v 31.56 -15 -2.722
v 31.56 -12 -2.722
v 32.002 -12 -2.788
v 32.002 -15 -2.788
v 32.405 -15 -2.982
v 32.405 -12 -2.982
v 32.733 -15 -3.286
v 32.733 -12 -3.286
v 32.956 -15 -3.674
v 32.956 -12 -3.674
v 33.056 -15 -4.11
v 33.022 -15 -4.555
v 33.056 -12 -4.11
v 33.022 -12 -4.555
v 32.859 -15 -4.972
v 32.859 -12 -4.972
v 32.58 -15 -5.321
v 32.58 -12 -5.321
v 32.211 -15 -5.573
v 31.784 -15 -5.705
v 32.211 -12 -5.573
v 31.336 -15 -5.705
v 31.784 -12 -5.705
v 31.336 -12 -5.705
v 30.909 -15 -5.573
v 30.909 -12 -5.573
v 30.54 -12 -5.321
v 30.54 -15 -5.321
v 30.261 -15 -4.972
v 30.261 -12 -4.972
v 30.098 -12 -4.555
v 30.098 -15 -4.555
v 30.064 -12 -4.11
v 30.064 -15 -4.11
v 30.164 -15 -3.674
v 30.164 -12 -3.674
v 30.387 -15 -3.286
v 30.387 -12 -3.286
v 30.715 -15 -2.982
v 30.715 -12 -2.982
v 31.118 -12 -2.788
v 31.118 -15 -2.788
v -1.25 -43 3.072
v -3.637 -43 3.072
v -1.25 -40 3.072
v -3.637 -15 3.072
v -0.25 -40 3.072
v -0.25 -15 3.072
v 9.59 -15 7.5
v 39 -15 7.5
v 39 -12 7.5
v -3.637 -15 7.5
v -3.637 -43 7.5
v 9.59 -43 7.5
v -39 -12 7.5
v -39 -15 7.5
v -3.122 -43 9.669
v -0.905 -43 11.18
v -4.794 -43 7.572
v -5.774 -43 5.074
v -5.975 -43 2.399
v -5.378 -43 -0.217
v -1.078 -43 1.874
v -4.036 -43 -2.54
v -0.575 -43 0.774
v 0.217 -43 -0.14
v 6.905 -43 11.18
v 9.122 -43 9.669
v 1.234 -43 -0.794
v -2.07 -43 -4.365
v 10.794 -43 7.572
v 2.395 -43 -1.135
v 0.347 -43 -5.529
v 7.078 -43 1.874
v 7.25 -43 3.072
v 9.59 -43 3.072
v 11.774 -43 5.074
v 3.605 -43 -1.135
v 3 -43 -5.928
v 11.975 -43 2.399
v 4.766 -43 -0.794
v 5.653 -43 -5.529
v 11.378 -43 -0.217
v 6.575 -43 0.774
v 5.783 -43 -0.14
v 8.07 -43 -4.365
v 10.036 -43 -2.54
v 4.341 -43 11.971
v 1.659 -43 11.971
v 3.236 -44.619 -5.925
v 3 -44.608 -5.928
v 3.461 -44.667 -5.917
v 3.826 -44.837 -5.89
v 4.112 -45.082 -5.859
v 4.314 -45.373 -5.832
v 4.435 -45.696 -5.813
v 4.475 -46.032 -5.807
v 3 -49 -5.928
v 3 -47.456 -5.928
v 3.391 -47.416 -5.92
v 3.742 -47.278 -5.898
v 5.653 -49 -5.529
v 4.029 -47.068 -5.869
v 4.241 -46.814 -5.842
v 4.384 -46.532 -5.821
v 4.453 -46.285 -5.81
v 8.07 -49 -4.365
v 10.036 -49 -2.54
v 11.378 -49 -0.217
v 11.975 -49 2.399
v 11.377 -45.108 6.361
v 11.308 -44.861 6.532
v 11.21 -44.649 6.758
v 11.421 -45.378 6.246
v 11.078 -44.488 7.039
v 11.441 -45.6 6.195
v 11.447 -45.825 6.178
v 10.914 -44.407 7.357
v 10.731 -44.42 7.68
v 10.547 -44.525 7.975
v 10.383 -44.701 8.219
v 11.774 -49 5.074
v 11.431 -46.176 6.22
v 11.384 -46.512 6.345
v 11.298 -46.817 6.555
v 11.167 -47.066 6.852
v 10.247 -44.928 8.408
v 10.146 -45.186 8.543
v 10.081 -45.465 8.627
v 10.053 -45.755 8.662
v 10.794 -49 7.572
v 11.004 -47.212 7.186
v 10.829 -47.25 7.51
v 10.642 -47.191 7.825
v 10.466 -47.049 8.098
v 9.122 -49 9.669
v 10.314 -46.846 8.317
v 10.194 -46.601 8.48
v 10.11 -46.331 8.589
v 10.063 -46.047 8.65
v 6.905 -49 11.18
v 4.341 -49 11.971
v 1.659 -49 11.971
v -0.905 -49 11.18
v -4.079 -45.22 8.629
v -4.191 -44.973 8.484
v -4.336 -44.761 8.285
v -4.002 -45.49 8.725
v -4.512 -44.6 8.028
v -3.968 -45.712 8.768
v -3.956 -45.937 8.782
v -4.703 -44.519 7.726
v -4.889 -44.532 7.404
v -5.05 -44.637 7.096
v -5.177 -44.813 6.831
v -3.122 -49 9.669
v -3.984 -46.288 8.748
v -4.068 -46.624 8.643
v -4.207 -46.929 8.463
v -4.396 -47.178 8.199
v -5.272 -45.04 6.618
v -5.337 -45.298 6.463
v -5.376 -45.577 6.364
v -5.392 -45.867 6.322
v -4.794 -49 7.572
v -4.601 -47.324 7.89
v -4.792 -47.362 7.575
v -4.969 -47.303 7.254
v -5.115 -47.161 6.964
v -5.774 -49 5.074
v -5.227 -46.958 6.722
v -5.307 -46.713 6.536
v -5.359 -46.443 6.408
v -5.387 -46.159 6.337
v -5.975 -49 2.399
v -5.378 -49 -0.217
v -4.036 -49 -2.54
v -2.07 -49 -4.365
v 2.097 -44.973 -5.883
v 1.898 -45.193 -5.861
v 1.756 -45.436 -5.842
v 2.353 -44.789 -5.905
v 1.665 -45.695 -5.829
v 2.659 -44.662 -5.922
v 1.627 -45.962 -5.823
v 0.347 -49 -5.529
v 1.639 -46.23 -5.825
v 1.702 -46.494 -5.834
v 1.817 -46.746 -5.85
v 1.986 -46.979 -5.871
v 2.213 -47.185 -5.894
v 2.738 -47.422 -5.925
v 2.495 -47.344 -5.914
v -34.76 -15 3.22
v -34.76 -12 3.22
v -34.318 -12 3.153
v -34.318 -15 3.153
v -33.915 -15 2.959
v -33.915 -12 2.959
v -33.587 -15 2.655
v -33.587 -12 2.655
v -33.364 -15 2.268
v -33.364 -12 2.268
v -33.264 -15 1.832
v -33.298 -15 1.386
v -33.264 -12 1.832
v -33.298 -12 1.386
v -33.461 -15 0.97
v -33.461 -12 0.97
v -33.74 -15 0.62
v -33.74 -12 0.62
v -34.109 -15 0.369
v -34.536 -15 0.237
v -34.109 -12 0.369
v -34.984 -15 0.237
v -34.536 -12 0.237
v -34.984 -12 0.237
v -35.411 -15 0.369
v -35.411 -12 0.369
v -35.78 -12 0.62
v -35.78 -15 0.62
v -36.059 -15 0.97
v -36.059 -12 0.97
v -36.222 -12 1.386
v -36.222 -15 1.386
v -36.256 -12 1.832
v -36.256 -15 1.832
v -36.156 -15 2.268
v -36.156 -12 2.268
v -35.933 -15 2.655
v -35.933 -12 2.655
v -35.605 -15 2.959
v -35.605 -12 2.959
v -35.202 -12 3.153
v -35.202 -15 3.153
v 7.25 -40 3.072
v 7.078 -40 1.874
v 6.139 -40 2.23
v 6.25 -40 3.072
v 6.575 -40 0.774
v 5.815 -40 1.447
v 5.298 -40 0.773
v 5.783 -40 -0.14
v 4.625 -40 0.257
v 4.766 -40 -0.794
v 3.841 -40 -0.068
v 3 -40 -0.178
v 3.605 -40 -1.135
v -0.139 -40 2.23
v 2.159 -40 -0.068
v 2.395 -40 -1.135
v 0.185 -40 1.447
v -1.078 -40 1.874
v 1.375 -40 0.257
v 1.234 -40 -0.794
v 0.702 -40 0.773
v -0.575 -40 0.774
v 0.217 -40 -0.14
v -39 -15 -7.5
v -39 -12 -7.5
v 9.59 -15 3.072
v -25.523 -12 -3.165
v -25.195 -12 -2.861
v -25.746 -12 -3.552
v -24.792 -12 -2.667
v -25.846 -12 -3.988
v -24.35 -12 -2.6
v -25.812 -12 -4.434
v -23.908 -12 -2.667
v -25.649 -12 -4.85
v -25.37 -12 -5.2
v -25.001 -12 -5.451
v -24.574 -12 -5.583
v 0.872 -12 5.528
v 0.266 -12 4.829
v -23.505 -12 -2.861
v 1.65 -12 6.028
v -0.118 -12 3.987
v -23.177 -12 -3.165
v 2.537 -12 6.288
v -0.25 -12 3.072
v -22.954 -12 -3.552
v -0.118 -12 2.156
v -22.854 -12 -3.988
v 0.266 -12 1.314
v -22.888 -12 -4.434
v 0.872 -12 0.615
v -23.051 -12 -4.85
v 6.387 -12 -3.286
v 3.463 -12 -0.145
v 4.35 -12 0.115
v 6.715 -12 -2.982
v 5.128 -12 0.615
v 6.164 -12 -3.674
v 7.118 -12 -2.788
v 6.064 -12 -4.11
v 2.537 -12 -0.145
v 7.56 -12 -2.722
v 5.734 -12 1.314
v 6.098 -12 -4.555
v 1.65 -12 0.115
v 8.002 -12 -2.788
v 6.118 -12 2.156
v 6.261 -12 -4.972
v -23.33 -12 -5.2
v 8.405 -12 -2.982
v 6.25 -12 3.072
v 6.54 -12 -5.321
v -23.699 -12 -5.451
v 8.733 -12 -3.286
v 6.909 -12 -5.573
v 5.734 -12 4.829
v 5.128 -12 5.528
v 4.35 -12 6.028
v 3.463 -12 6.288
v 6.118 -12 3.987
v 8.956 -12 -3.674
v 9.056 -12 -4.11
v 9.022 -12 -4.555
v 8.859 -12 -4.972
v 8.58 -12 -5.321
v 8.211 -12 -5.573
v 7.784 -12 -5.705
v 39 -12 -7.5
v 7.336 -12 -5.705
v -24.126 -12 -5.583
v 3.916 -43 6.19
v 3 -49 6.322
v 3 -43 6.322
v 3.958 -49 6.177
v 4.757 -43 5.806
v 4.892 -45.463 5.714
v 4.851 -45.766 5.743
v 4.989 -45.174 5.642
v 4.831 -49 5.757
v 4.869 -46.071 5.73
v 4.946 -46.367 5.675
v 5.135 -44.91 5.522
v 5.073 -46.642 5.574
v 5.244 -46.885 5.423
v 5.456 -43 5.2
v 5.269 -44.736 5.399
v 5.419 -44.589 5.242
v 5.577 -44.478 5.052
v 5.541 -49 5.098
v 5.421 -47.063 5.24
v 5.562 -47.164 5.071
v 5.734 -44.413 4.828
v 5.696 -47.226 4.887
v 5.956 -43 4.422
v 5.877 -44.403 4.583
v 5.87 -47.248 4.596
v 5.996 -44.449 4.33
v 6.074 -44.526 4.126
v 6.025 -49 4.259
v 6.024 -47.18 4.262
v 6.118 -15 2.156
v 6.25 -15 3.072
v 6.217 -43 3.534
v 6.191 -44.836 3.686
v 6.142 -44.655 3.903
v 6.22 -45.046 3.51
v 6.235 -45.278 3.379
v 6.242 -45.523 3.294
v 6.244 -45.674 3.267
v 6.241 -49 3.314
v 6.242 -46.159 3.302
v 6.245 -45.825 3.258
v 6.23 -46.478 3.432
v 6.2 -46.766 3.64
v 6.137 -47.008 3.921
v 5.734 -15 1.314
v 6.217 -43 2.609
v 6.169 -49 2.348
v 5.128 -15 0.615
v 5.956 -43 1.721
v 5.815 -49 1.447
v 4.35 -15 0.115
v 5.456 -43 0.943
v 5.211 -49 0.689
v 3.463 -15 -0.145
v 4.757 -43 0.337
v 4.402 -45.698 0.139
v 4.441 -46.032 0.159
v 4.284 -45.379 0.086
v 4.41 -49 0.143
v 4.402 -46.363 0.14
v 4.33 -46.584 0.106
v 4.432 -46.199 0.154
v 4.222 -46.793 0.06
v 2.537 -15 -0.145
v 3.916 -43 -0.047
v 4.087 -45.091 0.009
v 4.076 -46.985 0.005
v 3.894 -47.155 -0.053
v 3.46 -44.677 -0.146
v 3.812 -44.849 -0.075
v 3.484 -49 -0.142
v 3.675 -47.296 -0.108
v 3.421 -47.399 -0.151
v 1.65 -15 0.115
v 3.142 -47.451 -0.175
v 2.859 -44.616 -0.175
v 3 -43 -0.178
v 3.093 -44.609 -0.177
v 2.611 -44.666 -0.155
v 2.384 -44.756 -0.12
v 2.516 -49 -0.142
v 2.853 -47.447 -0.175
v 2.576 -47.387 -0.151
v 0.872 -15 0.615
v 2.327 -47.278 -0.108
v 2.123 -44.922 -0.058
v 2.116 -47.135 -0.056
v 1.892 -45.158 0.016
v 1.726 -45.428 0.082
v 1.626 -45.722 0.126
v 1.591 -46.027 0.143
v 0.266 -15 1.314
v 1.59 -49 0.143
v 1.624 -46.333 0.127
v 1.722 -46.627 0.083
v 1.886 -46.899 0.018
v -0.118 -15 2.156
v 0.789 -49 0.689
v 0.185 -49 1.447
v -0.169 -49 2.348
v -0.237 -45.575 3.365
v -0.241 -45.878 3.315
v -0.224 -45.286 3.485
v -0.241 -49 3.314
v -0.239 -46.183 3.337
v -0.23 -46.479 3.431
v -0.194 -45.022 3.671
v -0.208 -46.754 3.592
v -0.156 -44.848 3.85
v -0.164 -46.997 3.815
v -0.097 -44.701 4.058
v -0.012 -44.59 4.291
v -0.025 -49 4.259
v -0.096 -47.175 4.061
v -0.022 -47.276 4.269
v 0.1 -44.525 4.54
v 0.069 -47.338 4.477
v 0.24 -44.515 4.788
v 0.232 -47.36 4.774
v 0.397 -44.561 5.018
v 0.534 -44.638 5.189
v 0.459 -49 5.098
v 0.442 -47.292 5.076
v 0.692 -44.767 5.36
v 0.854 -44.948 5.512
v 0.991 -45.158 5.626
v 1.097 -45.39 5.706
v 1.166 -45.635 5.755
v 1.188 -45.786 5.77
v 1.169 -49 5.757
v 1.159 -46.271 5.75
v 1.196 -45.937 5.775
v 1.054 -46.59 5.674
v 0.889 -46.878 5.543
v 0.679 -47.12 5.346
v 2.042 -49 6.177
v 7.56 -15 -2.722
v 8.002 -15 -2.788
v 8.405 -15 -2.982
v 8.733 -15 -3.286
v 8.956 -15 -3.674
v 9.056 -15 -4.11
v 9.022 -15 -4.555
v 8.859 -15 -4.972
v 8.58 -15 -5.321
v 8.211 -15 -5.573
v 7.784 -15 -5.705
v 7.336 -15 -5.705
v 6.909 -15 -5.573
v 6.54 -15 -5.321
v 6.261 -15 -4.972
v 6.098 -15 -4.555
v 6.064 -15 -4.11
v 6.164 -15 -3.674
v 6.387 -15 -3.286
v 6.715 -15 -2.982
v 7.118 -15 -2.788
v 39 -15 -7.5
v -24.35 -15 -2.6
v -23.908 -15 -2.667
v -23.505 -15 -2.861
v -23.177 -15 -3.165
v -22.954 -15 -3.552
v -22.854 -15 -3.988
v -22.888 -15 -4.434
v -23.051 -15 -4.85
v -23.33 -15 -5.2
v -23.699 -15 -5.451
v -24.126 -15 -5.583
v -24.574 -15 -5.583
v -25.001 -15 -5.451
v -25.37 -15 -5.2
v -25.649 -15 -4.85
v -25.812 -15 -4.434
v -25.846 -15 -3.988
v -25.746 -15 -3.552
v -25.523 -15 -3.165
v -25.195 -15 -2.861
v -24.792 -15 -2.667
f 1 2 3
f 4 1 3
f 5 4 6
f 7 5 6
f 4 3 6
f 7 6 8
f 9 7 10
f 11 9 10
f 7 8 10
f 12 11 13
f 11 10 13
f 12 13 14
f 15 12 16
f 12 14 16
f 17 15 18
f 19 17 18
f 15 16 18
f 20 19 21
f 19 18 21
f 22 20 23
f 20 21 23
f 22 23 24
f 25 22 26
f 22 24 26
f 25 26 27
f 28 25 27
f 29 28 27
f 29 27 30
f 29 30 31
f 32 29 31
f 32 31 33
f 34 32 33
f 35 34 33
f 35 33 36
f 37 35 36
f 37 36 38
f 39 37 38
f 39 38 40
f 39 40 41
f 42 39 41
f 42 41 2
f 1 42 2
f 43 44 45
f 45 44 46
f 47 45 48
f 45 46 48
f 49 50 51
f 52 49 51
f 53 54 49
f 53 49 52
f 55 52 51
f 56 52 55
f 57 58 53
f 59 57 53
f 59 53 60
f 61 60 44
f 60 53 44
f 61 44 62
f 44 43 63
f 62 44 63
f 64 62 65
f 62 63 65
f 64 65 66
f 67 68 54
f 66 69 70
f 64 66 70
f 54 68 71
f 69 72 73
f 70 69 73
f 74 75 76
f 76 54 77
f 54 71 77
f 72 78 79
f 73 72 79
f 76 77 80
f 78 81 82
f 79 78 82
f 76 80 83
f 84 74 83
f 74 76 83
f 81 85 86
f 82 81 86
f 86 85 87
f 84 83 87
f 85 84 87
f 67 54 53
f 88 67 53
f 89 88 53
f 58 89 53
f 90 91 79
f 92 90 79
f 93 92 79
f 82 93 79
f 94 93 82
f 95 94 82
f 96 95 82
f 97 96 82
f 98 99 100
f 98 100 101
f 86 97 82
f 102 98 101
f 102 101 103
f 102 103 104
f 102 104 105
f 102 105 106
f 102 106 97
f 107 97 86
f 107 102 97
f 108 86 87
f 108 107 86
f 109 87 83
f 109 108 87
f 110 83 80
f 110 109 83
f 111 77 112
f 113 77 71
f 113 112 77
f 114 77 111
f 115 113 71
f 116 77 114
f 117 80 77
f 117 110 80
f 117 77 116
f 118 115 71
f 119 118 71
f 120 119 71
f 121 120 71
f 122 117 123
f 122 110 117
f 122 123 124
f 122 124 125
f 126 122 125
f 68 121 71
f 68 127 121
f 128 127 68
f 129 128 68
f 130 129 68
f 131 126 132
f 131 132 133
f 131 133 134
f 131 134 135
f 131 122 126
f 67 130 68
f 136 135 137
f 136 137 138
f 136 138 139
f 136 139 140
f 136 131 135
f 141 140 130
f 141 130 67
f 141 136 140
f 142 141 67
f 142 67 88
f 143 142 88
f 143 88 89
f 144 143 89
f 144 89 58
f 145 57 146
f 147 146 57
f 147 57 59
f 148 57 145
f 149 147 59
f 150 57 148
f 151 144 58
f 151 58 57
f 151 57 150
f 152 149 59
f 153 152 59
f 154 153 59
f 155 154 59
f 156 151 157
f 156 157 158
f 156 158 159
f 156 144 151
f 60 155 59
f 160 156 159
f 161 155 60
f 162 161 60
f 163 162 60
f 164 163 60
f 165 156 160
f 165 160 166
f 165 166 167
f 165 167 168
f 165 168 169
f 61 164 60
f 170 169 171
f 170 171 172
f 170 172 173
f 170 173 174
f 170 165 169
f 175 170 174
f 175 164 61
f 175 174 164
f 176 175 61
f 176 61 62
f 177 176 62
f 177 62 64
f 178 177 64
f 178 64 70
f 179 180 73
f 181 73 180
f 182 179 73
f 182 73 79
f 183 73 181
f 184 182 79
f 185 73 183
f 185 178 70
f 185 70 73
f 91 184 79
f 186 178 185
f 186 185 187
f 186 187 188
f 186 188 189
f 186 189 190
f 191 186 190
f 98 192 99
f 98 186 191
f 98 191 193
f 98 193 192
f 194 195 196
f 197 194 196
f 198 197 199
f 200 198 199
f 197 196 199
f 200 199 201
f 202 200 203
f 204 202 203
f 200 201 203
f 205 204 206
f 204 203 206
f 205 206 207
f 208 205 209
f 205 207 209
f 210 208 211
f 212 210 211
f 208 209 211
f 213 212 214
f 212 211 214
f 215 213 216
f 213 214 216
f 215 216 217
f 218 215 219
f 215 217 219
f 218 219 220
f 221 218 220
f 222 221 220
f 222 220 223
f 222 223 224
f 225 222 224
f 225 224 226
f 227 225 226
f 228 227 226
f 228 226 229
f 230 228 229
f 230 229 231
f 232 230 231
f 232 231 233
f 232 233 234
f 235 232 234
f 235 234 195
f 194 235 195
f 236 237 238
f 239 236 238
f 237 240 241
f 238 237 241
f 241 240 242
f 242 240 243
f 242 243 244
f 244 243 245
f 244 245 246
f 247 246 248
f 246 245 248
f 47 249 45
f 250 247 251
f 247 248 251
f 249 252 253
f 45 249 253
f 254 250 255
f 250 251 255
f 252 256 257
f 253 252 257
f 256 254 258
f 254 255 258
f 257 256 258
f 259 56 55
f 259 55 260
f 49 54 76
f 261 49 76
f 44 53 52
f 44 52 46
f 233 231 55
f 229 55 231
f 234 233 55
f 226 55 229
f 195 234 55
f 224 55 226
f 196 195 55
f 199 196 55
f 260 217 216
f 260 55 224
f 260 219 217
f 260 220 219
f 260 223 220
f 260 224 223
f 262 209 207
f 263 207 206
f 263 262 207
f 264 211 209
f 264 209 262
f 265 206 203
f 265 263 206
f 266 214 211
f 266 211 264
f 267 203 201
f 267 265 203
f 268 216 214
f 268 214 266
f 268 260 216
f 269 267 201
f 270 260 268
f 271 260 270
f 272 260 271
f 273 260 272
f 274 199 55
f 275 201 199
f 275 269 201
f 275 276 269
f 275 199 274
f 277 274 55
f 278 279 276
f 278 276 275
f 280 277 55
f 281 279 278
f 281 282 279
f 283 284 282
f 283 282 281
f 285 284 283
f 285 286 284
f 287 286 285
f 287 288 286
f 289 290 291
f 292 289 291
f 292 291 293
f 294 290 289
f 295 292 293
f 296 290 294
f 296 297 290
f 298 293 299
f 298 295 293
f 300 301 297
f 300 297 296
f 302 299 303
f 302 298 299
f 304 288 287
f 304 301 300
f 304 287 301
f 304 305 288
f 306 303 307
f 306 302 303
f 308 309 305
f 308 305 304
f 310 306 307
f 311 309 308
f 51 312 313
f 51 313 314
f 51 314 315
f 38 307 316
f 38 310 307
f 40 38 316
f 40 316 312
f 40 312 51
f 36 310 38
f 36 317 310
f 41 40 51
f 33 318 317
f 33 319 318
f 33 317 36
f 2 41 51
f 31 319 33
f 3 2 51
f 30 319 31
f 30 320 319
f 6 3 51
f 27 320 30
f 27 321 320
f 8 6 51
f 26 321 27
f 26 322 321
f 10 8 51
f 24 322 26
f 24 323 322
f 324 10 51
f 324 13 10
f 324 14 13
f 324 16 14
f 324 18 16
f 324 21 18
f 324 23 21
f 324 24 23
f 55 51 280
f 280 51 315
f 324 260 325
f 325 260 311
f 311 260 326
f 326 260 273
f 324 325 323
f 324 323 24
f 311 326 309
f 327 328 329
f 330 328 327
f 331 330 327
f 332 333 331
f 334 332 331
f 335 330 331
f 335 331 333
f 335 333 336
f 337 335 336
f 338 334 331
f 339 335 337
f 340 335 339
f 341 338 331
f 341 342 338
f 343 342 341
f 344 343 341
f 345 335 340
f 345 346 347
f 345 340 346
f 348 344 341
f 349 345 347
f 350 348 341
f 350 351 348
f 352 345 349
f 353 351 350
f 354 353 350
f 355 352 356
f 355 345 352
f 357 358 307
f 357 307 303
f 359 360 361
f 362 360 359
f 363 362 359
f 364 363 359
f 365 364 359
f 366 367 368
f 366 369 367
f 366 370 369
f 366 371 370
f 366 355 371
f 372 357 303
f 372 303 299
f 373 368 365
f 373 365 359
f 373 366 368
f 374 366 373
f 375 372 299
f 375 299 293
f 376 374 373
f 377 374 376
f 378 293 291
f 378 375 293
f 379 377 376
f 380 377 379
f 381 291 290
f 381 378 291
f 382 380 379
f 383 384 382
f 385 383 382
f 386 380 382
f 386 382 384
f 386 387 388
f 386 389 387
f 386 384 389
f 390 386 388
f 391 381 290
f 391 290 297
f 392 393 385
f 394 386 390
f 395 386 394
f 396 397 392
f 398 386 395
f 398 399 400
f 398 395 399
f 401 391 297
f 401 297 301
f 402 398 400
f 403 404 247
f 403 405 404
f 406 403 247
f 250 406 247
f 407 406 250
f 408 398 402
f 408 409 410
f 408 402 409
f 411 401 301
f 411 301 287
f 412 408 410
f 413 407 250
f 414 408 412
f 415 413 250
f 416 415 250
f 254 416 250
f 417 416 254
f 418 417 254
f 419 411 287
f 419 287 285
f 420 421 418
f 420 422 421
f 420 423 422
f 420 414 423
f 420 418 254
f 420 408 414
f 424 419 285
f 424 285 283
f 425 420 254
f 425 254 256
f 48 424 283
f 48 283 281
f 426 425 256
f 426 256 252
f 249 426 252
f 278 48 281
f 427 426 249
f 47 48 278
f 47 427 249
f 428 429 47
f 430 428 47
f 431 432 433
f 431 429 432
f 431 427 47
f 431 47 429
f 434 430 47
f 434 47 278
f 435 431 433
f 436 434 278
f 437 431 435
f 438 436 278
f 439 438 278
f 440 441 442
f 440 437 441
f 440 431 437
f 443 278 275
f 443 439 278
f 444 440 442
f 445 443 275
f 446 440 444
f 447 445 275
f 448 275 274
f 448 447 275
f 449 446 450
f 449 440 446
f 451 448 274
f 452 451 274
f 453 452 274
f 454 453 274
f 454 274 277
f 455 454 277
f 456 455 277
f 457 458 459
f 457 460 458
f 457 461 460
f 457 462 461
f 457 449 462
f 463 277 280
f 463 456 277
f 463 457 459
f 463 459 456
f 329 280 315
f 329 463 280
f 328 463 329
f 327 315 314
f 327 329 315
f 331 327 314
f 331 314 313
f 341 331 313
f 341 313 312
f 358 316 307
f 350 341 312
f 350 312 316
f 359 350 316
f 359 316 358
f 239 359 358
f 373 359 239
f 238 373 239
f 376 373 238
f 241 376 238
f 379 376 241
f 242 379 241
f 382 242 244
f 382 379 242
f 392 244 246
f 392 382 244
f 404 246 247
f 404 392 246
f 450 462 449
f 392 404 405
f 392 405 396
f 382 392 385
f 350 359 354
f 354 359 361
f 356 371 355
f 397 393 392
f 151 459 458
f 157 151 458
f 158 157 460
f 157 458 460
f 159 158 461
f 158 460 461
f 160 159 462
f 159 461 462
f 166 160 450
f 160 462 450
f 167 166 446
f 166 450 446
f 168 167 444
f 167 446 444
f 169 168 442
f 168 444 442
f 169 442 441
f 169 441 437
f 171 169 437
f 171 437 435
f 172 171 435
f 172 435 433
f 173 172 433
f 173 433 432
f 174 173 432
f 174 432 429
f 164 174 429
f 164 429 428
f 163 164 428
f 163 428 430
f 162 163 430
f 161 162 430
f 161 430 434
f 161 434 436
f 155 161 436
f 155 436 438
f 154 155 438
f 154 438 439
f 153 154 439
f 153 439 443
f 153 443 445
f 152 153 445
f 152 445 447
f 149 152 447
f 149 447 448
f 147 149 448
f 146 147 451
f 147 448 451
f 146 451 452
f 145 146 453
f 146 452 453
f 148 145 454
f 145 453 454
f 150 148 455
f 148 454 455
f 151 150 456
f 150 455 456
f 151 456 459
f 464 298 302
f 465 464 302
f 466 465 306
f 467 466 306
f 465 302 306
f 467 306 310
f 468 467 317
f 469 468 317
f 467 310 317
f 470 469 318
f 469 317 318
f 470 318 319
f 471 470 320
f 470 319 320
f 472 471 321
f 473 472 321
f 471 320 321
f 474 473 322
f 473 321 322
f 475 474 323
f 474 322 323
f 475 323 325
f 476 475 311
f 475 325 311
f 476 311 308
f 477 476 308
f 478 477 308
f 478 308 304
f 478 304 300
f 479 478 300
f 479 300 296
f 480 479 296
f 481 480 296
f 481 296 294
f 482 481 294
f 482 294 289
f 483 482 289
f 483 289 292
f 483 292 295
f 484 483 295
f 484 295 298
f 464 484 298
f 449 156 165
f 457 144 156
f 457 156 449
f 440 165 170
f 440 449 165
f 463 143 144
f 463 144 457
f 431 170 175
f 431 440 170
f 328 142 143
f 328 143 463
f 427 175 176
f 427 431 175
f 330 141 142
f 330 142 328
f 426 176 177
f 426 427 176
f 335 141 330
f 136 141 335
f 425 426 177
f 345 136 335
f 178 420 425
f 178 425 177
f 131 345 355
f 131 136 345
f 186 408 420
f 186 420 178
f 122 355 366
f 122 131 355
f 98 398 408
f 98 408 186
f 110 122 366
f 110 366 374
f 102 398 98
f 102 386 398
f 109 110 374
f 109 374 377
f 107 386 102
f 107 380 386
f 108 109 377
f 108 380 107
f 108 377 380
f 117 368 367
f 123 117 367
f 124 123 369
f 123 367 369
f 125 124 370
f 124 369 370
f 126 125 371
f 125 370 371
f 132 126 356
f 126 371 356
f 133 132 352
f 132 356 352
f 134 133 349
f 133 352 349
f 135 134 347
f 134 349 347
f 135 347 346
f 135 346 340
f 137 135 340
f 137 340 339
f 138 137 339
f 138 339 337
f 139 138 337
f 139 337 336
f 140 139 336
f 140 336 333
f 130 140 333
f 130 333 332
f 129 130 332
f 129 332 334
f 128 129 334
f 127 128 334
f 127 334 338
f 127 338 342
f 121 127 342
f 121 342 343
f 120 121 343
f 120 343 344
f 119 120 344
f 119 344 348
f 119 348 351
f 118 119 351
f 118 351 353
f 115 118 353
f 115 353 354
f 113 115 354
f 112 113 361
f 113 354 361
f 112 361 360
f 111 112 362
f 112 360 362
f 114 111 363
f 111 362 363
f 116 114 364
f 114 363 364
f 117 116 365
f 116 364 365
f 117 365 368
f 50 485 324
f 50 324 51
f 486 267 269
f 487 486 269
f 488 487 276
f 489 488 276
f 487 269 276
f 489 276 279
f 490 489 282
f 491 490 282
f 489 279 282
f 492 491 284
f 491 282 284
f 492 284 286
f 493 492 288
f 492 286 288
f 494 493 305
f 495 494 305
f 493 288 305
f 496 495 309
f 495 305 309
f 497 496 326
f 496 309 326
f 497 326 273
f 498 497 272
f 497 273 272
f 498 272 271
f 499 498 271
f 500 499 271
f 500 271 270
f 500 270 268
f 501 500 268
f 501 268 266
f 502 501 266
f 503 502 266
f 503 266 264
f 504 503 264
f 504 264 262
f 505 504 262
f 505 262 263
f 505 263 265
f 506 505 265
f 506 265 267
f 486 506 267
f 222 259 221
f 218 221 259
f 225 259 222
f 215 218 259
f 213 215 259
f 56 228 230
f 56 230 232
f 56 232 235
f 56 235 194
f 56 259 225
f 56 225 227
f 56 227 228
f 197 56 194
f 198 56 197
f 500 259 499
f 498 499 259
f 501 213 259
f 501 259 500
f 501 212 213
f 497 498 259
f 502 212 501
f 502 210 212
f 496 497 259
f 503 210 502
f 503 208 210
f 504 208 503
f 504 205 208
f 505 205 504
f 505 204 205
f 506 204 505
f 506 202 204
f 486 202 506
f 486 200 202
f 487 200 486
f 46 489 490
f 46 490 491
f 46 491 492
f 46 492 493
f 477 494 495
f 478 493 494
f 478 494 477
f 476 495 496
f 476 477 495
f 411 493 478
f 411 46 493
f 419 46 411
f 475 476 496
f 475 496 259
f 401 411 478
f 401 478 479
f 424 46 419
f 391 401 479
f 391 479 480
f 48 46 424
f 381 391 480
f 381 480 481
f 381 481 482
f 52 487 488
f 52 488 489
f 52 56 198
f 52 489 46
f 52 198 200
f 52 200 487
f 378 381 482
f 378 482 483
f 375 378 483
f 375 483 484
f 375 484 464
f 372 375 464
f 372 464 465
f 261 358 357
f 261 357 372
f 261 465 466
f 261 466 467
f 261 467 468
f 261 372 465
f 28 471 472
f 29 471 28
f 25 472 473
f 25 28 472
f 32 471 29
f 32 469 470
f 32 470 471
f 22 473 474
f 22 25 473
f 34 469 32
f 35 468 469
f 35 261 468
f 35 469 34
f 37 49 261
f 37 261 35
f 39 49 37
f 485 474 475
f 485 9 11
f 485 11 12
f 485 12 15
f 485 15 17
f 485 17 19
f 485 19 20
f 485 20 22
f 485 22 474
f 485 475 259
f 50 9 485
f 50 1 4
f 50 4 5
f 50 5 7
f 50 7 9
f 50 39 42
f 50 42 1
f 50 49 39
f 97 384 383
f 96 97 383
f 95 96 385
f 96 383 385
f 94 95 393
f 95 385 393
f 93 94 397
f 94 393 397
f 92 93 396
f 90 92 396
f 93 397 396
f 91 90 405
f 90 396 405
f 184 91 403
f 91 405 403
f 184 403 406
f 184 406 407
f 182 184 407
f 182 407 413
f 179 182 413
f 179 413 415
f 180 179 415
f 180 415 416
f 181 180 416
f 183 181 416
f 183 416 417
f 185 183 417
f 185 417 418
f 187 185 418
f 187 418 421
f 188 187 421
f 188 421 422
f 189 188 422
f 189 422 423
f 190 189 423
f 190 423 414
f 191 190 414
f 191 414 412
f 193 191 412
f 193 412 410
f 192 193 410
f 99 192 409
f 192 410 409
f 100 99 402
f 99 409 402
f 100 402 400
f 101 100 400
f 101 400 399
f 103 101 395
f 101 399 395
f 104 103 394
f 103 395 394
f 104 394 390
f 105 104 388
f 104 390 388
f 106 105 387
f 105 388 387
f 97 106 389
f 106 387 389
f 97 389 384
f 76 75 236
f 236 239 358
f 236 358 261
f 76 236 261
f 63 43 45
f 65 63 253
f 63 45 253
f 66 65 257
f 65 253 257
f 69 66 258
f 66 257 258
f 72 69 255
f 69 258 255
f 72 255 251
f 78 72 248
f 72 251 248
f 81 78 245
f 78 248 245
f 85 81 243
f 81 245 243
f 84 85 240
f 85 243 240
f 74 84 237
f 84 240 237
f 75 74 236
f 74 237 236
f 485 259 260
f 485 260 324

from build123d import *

# Parameters (mm, degrees)
SKETCH_1_W                = 78
SKETCH_1_H                = 15
EXTRUDE_1_DEPTH           = 3
SKETCH_3_R                = 1.5
CUT_EXTRUDE_1_DEPTH       = 3
SKETCH_4_R                = 6
EXTRUDE_2_DEPTH           = 18
SKETCH_5_R                = 4.5
CUT_EXTRUDE_2_DEPTH       = 21
F_2_0MM_2_D               = 3
F_2_0MM_2_DEPTH           = 4.5
F_2_0MM_2_TIP             = 1.5
F_2_0MM_2_ON_FACE_2_D     = 3
F_2_0MM_2_ON_FACE_2_DEPTH = 4.5
F_2_0MM_2_ON_FACE_2_TIP   = 1.5
SKETCH_10_W               = 6
SKETCH_10_H               = 10
CUT_EXTRUDE_3_DEPTH       = 7
SKETCH_13_W               = 19.835687411
SKETCH_13_H               = 21.610205193
CUT_EXTRUDE_4_DEPTH       = 20
SKETCH_14_W               = 11.523038103
SKETCH_14_H               = 10.49031299
EXTRUDE_3_DEPTH           = 3
SKETCH_18_W               = 78
SKETCH_18_H               = 8
EXTRUDE_4_DEPTH           = 3
SKETCH_19_W               = 36.767904102
SKETCH_19_H               = 2.5
EXTRUDE_5_DEPTH           = 12.5
SKETCH_23_R               = 1.65
CUT_EXTRUDE_6_DEPTH       = 12.5
SKETCH_25_W               = 4.236607592
SKETCH_25_H               = 5.36409187
EXTRUDE_7_DEPTH           = 2.5
SKETCH_26_R               = 1.6
CUT_EXTRUDE_7_DEPTH       = 2.5
SKETCH_27_W               = 21.346012392
SKETCH_27_H               = 6.594354882
EXTRUDE_8_DEPTH           = 2.5
SKETCH_28_W               = 36.767231154
SKETCH_28_H               = 5.91819544
EXTRUDE_9_DEPTH           = 2.5
SKETCH_29_W               = 27.660340415
SKETCH_29_H               = 3.5
CUT_EXTRUDE_9_DEPTH       = 2.5
SKETCH_30_W               = 78
SKETCH_30_H               = 8
CUT_EXTRUDE_10_DEPTH      = 100
SKETCH_31_W               = 60.820132647
SKETCH_31_H               = 3
EXTRUDE_10_DEPTH          = 49
SKETCH_32_W               = 48
SKETCH_32_H               = 3.2
CUT_EXTRUDE_11_DEPTH      = 49
SKETCH_33_W               = 15
SKETCH_33_H               = 49.05968874
CUT_EXTRUDE_12_DEPTH      = 100
SKETCH_34_R               = 4.25
EXTRUDE_11_DEPTH          = 49
SKETCH_35_R               = 6
EXTRUDE_12_DEPTH          = 6
SKETCH_36_W               = 8.5
SKETCH_36_H               = 40
CUT_EXTRUDE_13_DEPTH      = 11
SKETCH_37_R               = 3.25
CUT_EXTRUDE_16_DEPTH      = 100
SKETCH_39_W               = 8.456699936
SKETCH_39_H               = 16
CUT_EXTRUDE_17_DEPTH      = 1.25
F_3_0MM_1_D               = 2.85
F_3_0MM_1_DEPTH           = 4.143773618
F_3_0MM_1_TIP             = 0.856226382
F_3_0MM_2_D               = 2.85
F_3_0MM_2_DEPTH           = 4.143773618
F_3_0MM_2_TIP             = 0.856226382
F_3_0MM_3_D               = 2.85
F_3_0MM_3_DEPTH           = 4.143773618
F_3_0MM_3_TIP             = 0.856226382
SKETCH_46_W               = 13.227107738
SKETCH_46_H               = 4.428434999
EXTRUDE_13_DEPTH          = 46
CUT_EXTRUDE_18_DEPTH      = 55
EXTRUDE_START             = 15
EXTRUDE_14_DEPTH          = 15
SKETCH_50_R               = 1.5
CUT_EXTRUDE_19_DEPTH      = 15
SKETCH_51_R               = 1.5
CUT_EXTRUDE_20_DEPTH      = 15
SKETCH_52_R               = 1.5
CUT_EXTRUDE_21_DEPTH      = 15
SKETCH_53_R               = 1.5
CUT_EXTRUDE_22_DEPTH      = 15
SKETCH_54_W               = 78
SKETCH_54_H               = 15
CUT_EXTRUDE_23_DEPTH      = 15
F_3_0MM_4_D               = 2.85
F_3_0MM_4_DEPTH           = 4.143773618
F_3_0MM_4_TIP             = 0.856226382
F_3_0MM_5_D               = 2.85
F_3_0MM_5_DEPTH           = 4.143773618
F_3_0MM_5_TIP             = 0.856226382
SKETCH_60_R               = 9
EXTRUDE_15_DEPTH          = 6
CUT_EXTRUDE_START         = -6
SKETCH_61_R               = 3.25
CUT_EXTRUDE_24_DEPTH      = 6
F_3_0MM_6_D               = 2.85
F_3_0MM_6_DEPTH           = 9.143773618
F_3_0MM_6_TIP             = 0.856226382
F_3_0MM_7_D               = 2.85
F_3_0MM_7_DEPTH           = 9.143773618
F_3_0MM_7_TIP             = 0.856226382
F_3_0MM_7_ON_FACE_2_D     = 2.85
F_3_0MM_7_ON_FACE_2_DEPTH = 9.143773618
F_3_0MM_7_ON_FACE_2_TIP   = 0.856226382


with BuildPart() as part:
    # 草图1 → 凸台-拉伸1 (new body)
    with BuildSketch(Plane(origin=(0, 0, 0), x_dir=(1, 0, 0), z_dir=(0, 1, 0))):
        Rectangle(SKETCH_1_W, SKETCH_1_H)
    extrude(amount=EXTRUDE_1_DEPTH)

    # 草图3 → 切除-拉伸1 (cut)
    with BuildSketch(Plane(origin=(0, 3, 0), x_dir=(1, 0, 0), z_dir=(0, 1, 0))):
        with Locations(Location((-34.76, -1.72, 0), (0, 0, 270))):
            Circle(SKETCH_3_R)
        with Locations(Location((-24.35, 4.1, 0), (0, 0, 270))):
            Circle(SKETCH_3_R)
        with Locations(Location((31.56, 4.221692081, 0), (0, 0, 270))):
            Circle(SKETCH_3_R)
        with Locations(Location((7.56, 4.221692081, 0), (0, 0, 270))):
            Circle(SKETCH_3_R)
    extrude(amount=-CUT_EXTRUDE_1_DEPTH, mode=Mode.SUBTRACT)

    # 草图4 → 凸台-拉伸2 (add)
    with BuildSketch(Plane(origin=(0, 3, 0), x_dir=(1, 0, 0), z_dir=(0, 1, 0))):
        with Locations(Location((-3, -1.234165229, 0), (0, 0, 270))):
            Circle(SKETCH_4_R)
    extrude(amount=EXTRUDE_2_DEPTH)

    # 草图5 → 切除-拉伸2 (cut)
    with BuildSketch(Plane(origin=(0, 21, 0), x_dir=(1, 0, 0), z_dir=(0, 1, 0))):
        with Locations(Location((-3, -1.234165229, 0), (0, 0, 270))):
            Circle(SKETCH_5_R)
    extrude(amount=-CUT_EXTRUDE_2_DEPTH, mode=Mode.SUBTRACT)

    # Ø2.0mm 暗销孔2
    with Locations(Plane(origin=(-7.901331048, 17.342107422, 4.694938836), x_dir=(-0.576795601176, 0, -0.816888507977), z_dir=(-0.816888507977, 0, 0.576795601176))):
        with Locations((0, 0)):
            Hole(F_2_0MM_2_D / 2, depth=F_2_0MM_2_DEPTH)
            with Locations((0, 0, -(F_2_0MM_2_DEPTH + F_2_0MM_2_TIP / 2))):  # 90° drill point
                Cone(0, F_2_0MM_2_D / 2, F_2_0MM_2_TIP, mode=Mode.SUBTRACT)

    # Ø2.0mm 暗销孔2 on face 2
    with Locations(Plane(origin=(1.071764877, 17.164817099, 5.641061052), x_dir=(0.734483043181, 0, -0.678627039897), z_dir=(0.678627039897, 0, 0.734483043181))):
        with Locations((0, 0)):
            Hole(F_2_0MM_2_ON_FACE_2_D / 2, depth=F_2_0MM_2_ON_FACE_2_DEPTH)
            with Locations((0, 0, -(F_2_0MM_2_ON_FACE_2_DEPTH + F_2_0MM_2_ON_FACE_2_TIP / 2))):  # 90° drill point
                Cone(0, F_2_0MM_2_ON_FACE_2_D / 2, F_2_0MM_2_ON_FACE_2_TIP, mode=Mode.SUBTRACT)

    # 草图10 → 切除-拉伸3 (cut)
    with BuildSketch(Plane(origin=(0, 0, -7.5), x_dir=(-1, 0, 0), z_dir=(0, 0, -1))):
        with Locations((3, 8)):
            Rectangle(SKETCH_10_W, SKETCH_10_H)
    extrude(amount=-CUT_EXTRUDE_3_DEPTH, mode=Mode.SUBTRACT)

    # 草图13 → 切除-拉伸4 (cut)
    with BuildSketch(Plane(origin=(0, 0, -7.5), x_dir=(-1, 0, 0), z_dir=(0, 0, -1))):
        with Locations((3.314421038, 13.805102597)):
            Rectangle(SKETCH_13_W, SKETCH_13_H)
    extrude(amount=-CUT_EXTRUDE_4_DEPTH, mode=Mode.SUBTRACT)

    # 草图14 → 凸台-拉伸3 (add)
    with BuildSketch(Plane(origin=(0, 3, 0), x_dir=(1, 0, 0), z_dir=(0, 1, 0))):
        with Locations((-2.989467433, -1.263493391)):
            Rectangle(SKETCH_14_W, SKETCH_14_H)
    extrude(amount=-EXTRUDE_3_DEPTH)

    # 草图18 → 凸台-拉伸4 (add)
    with BuildSketch(Plane.XZ):
        with Locations((0, 11.5)):
            Rectangle(SKETCH_18_W, SKETCH_18_H)
    extrude(amount=-EXTRUDE_4_DEPTH)

    # 草图19 → 凸台-拉伸5 (add)
    with BuildSketch(Plane.XZ):
        with Locations((0.839237194, 14.25)):
            Rectangle(SKETCH_19_W, SKETCH_19_H)
    extrude(amount=EXTRUDE_5_DEPTH)

    # 草图23 → 切除-拉伸6 (cut)
    with BuildSketch(Plane(origin=(0, 0, 13), x_dir=(-1, 0, 0), z_dir=(0, 0, -1))):
        with Locations((-8.603189245, -6.05592298)):
            Circle(SKETCH_23_R)
        with Locations((2.596810755, -6.05592298)):
            Circle(SKETCH_23_R)
    extrude(amount=-CUT_EXTRUDE_6_DEPTH, mode=Mode.SUBTRACT)

    # 草图25 → 凸台-拉伸7 (add)
    with BuildSketch(Plane(origin=(0, 0, 13), x_dir=(-1, 0, 0), z_dir=(0, 0, -1))):
        with Locations((2.330668631, -6.426480946)):
            Rectangle(SKETCH_25_W, SKETCH_25_H)
    extrude(amount=-EXTRUDE_7_DEPTH)

    # 草图26 → 切除-拉伸7 (cut)
    with BuildSketch(Plane(origin=(0, 0, 13), x_dir=(-1, 0, 0), z_dir=(0, 0, -1))):
        with Locations((4.196810755, -6.05592298)):
            Circle(SKETCH_26_R)
    extrude(amount=-CUT_EXTRUDE_7_DEPTH, mode=Mode.SUBTRACT)

    # 草图27 → 凸台-拉伸8 (add)
    with BuildSketch(Plane(origin=(0, 0, 13), x_dir=(-1, 0, 0), z_dir=(0, 0, -1))):
        with Locations((-2.379316694, -6.691741876)):
            Rectangle(SKETCH_27_W, SKETCH_27_H)
    extrude(amount=-EXTRUDE_8_DEPTH)

    # 草图28 → 凸台-拉伸9 (add)
    with BuildSketch(Plane(origin=(0, 0, 13), x_dir=(-1, 0, 0), z_dir=(0, 0, -1))):
        with Locations((-0.839573668, -15.45909772)):
            Rectangle(SKETCH_28_W, SKETCH_28_H)
    extrude(amount=-EXTRUDE_9_DEPTH)

    # 草图29 → 切除-拉伸9 (cut)
    with BuildSketch(Plane(origin=(0, 0, 13), x_dir=(-1, 0, 0), z_dir=(0, 0, -1))):
        with Locations((-0.633763758, -13.394190827)):
            Rectangle(SKETCH_29_W, SKETCH_29_H)
    extrude(amount=-CUT_EXTRUDE_9_DEPTH, mode=Mode.SUBTRACT)

    # 草图30 → 切除-拉伸10 (cut)
    with BuildSketch(Plane(origin=(0, 3, 0), x_dir=(1, 0, 0), z_dir=(0, 1, 0))):
        with Locations((0, -11.5)):
            Rectangle(SKETCH_30_W, SKETCH_30_H)
    extrude(amount=-CUT_EXTRUDE_10_DEPTH, mode=Mode.SUBTRACT)

    # 草图31 → 凸台-拉伸10 (add)
    with BuildSketch(Plane.XZ):
        with Locations((0.65611444, 6)):
            Rectangle(SKETCH_31_W, SKETCH_31_H)
    extrude(amount=EXTRUDE_10_DEPTH)

    # 草图32 → 切除-拉伸11 (cut)
    with BuildSketch(Plane(origin=(0, 0, 4.5), x_dir=(-1, 0, 0), z_dir=(0, 0, -1))):
        with Locations((-0.175604554, -15.854114518)):
            Rectangle(SKETCH_32_W, SKETCH_32_H)
        with Locations((-0.205191163, -23.054114518)):
            Rectangle(SKETCH_32_W, SKETCH_32_H)
        with Locations((-0.173277927, -30.254114518)):
            Rectangle(SKETCH_32_W, SKETCH_32_H)
        with Locations((-0.15338956, -37.454114518)):
            Rectangle(SKETCH_32_W, SKETCH_32_H)
        with Locations((-0.189333293, -44.654114518)):
            Rectangle(SKETCH_32_W, SKETCH_32_H)
        with Locations((-0.276259634, -9.654114518)):
            Rectangle(SKETCH_32_W, SKETCH_32_H)
    extrude(amount=-CUT_EXTRUDE_11_DEPTH, mode=Mode.SUBTRACT)

    # 草图33 → 切除-拉伸12 (cut)
    with BuildSketch(Plane(origin=(31.066180764, 0, 0), x_dir=(0, 0, -1), z_dir=(1, 0, 0))):
        with Locations((0, -24.52984437)):
            Rectangle(SKETCH_33_W, SKETCH_33_H)
    extrude(amount=-CUT_EXTRUDE_12_DEPTH, mode=Mode.SUBTRACT)

    # 草图34 → 凸台-拉伸11 (add)
    with BuildSketch(Plane.XZ):
        with Locations(Location((3, 3.071565001, 0), (0, 0, 90))):
            Circle(SKETCH_34_R)
    extrude(amount=EXTRUDE_11_DEPTH)

    # 草图35 → 凸台-拉伸12 (add)
    with BuildSketch(Plane.XZ.offset(49)):
        with Locations(Location((3, 3.071565001, 0), (0, 0, 270))):
            Circle(SKETCH_35_R)
    extrude(amount=-EXTRUDE_12_DEPTH)

    # 草图36 → 切除-拉伸13 (cut)
    with BuildSketch(Plane(origin=(0, 0, -7.5), x_dir=(-1, 0, 0), z_dir=(0, 0, -1))):
        with Locations((-3, -20)):
            Rectangle(SKETCH_36_W, SKETCH_36_H)
    extrude(amount=-CUT_EXTRUDE_13_DEPTH, mode=Mode.SUBTRACT)

    # 草图37 → 切除-拉伸16 (cut)
    with BuildSketch(Plane.XZ.offset(49)):
        with Locations(Location((3, 3.071565001, 0), (0, 0, 270))):
            Circle(SKETCH_37_R)
    extrude(amount=-CUT_EXTRUDE_16_DEPTH, mode=Mode.SUBTRACT)

    # 草图39 → 切除-拉伸17 (cut)
    with BuildSketch(Plane(origin=(0, 0, 3.5), x_dir=(-1, 0, 0), z_dir=(0, 0, -1))):
        with Locations((-3, -32)):
            Rectangle(SKETCH_39_W, SKETCH_39_H)
    extrude(amount=-CUT_EXTRUDE_17_DEPTH, mode=Mode.SUBTRACT)

    # Ø3.0mm 暗销孔1
    with Locations(Plane(origin=(3.06916604, -45.926554475, -2.928036324), x_dir=(-0.999933554166, 0, -0.011527673319), z_dir=(0.011527673319, 0, -0.999933554166))):
        with Locations((0, 0)):
            Hole(F_3_0MM_1_D / 2, depth=F_3_0MM_1_DEPTH)
            with Locations((0, 0, -(F_3_0MM_1_DEPTH + F_3_0MM_1_TIP / 2))):  # 118° drill point
                Cone(0, F_3_0MM_1_D / 2, F_3_0MM_1_TIP, mode=Mode.SUBTRACT)

    # Ø3.0mm 暗销孔2
    with Locations(Plane(origin=(-2.19436254, -45.980907568, 6.074663036), x_dir=(-0.500516339146, 0, -0.865727089936), z_dir=(-0.865727089936, 0, 0.500516339146))):
        with Locations((0, 0)):
            Hole(F_3_0MM_2_D / 2, depth=F_3_0MM_2_DEPTH)
            with Locations((0, 0, -(F_3_0MM_2_DEPTH + F_3_0MM_2_TIP / 2))):  # 118° drill point
                Cone(0, F_3_0MM_2_D / 2, F_3_0MM_2_TIP, mode=Mode.SUBTRACT)

    # Ø3.0mm 暗销孔3
    with Locations(Plane(origin=(8.205806468, -46.039954185, 6.054781221), x_dir=(-0.497202703373, 0, 0.86763441135), z_dir=(0.86763441135, 0, 0.497202703373))):
        with Locations((0, 0)):
            Hole(F_3_0MM_3_D / 2, depth=F_3_0MM_3_DEPTH)
            with Locations((0, 0, -(F_3_0MM_3_DEPTH + F_3_0MM_3_TIP / 2))):  # 118° drill point
                Cone(0, F_3_0MM_3_D / 2, F_3_0MM_3_TIP, mode=Mode.SUBTRACT)

    # 草图46 → 凸台-拉伸13 (add)
    with BuildSketch(Plane(origin=(0, 3, 0), x_dir=(1, 0, 0), z_dir=(0, 1, 0))):
        with Locations((2.976074231, -5.285782501)):
            Rectangle(SKETCH_46_W, SKETCH_46_H)
    extrude(amount=-EXTRUDE_13_DEPTH)

    # 草图48 → 切除-拉伸18 (cut)
    with BuildSketch(Plane.XZ.offset(49)):
        with BuildLine():
            Line((-0.25, 3.071565001), (6.25, 3.071565001))
            ThreePointArc((6.25, 3.071565001), (3, 6.321565001), (-0.25, 3.071565001))
        make_face()
    extrude(amount=-CUT_EXTRUDE_18_DEPTH, mode=Mode.SUBTRACT)

    # 草图49 → 凸台-拉伸14 (add)
    with BuildSketch(Plane.XZ.offset(EXTRUDE_START)):
        with BuildLine():
            Line((-0.25, 3.071565001), (-3.637479638, 3.071565001))
            Line((-3.637479638, 3.071565001), (-3.637479638, 7.5))
            Line((-3.637479638, 7.5), (-39, 7.5))
            Line((-39, 7.5), (-39, -7.5))
            Line((-39, -7.5), (39, -7.5))
            Line((39, -7.5), (39, 7.5))
            Line((39, 7.5), (9.5896281, 7.5))
            Line((9.5896281, 7.5), (9.5896281, 3.071565001))
            Line((9.5896281, 3.071565001), (6.25, 3.071565001))
            ThreePointArc((6.25, 3.071565001), (3, -0.178434999), (-0.25, 3.071565001))
        make_face()
    extrude(amount=-EXTRUDE_14_DEPTH)

    # 草图50 → 切除-拉伸19 (cut)
    with BuildSketch(Plane(origin=(0, 0, 0), x_dir=(1, 0, 0), z_dir=(0, 1, 0))):
        with Locations(Location((-34.76, -1.72, 0), (0, 0, 270))):
            Circle(SKETCH_50_R)
    extrude(amount=-CUT_EXTRUDE_19_DEPTH, mode=Mode.SUBTRACT)

    # 草图51 → 切除-拉伸20 (cut)
    with BuildSketch(Plane(origin=(0, 0, 0), x_dir=(1, 0, 0), z_dir=(0, 1, 0))):
        with Locations(Location((-24.35, 4.1, 0), (0, 0, 270))):
            Circle(SKETCH_51_R)
    extrude(amount=-CUT_EXTRUDE_20_DEPTH, mode=Mode.SUBTRACT)

    # 草图52 → 切除-拉伸21 (cut)
    with BuildSketch(Plane(origin=(0, 0, 0), x_dir=(1, 0, 0), z_dir=(0, 1, 0))):
        with Locations(Location((7.56, 4.221692081, 0), (0, 0, 270))):
            Circle(SKETCH_52_R)
    extrude(amount=-CUT_EXTRUDE_21_DEPTH, mode=Mode.SUBTRACT)

    # 草图53 → 切除-拉伸22 (cut)
    with BuildSketch(Plane(origin=(0, 0, 0), x_dir=(1, 0, 0), z_dir=(0, 1, 0))):
        with Locations(Location((31.56, 4.221692081, 0), (0, 0, 270))):
            Circle(SKETCH_53_R)
    extrude(amount=-CUT_EXTRUDE_22_DEPTH, mode=Mode.SUBTRACT)

    # 草图54 → 切除-拉伸23 (cut)
    with BuildSketch(Plane(origin=(0, 3, 0), x_dir=(1, 0, 0), z_dir=(0, 1, 0))):
        Rectangle(SKETCH_54_W, SKETCH_54_H)
    extrude(amount=-CUT_EXTRUDE_23_DEPTH, mode=Mode.SUBTRACT)

    # Ø3.0mm 暗销孔4
    with Locations(Plane(origin=(-2.206820669, -45.974417651, 0.09011929), x_dir=(0.496907618427, 0, -0.867803444767), z_dir=(-0.867803444767, 0, -0.496907618427))):
        with Locations((0, 0)):
            Hole(F_3_0MM_4_D / 2, depth=F_3_0MM_4_DEPTH)
            with Locations((0, 0, -(F_3_0MM_4_DEPTH + F_3_0MM_4_TIP / 2))):  # 118° drill point
                Cone(0, F_3_0MM_4_D / 2, F_3_0MM_4_TIP, mode=Mode.SUBTRACT)

    # Ø3.0mm 暗销孔5
    with Locations(Plane(origin=(8.192046128, -46.012961975, 0.064463904), x_dir=(0.501183516141, 0, 0.865341021303), z_dir=(0.865341021303, 0, -0.501183516141))):
        with Locations((0, 0)):
            Hole(F_3_0MM_5_D / 2, depth=F_3_0MM_5_DEPTH)
            with Locations((0, 0, -(F_3_0MM_5_DEPTH + F_3_0MM_5_TIP / 2))):  # 118° drill point
                Cone(0, F_3_0MM_5_D / 2, F_3_0MM_5_TIP, mode=Mode.SUBTRACT)

    # 草图60 → 凸台-拉伸15 (add)
    with BuildSketch(Plane.XZ.offset(49)):
        with Locations(Location((3, 3.071565001, 0), (0, 0, 270))):
            Circle(SKETCH_60_R)
    extrude(amount=-EXTRUDE_15_DEPTH)

    # 草图61 → 切除-拉伸24 (cut)
    with BuildSketch(Plane(origin=(0, -43, 0), x_dir=(1, 0, 0), z_dir=(0, 1, 0)).offset(CUT_EXTRUDE_START)):
        with Locations(Location((3, -3.071565001, 0), (0, 0, 270))):
            Circle(SKETCH_61_R)
    extrude(amount=CUT_EXTRUDE_24_DEPTH, mode=Mode.SUBTRACT)

    # Ø3.0mm 暗销孔6
    with Locations(Plane(origin=(3.050736778, -46.031856967, -5.928291986), x_dir=(-0.999984109623, 0, -0.00563741982), z_dir=(0.00563741982, 0, -0.999984109623))):
        with Locations((0, 0)):
            Hole(F_3_0MM_6_D / 2, depth=F_3_0MM_6_DEPTH)
            with Locations((0, 0, -(F_3_0MM_6_DEPTH + F_3_0MM_6_TIP / 2))):  # 118° drill point
                Cone(0, F_3_0MM_6_D / 2, F_3_0MM_6_TIP, mode=Mode.SUBTRACT)

    # Ø3.0mm 暗销孔7
    with Locations(Plane(origin=(10.848450321, -45.825193133, 7.476315567), x_dir=(-0.489416729598, 0, 0.872050035715), z_dir=(0.872050035715, 0, 0.489416729598))):
        with Locations((0, 0)):
            Hole(F_3_0MM_7_D / 2, depth=F_3_0MM_7_DEPTH)
            with Locations((0, 0, -(F_3_0MM_7_DEPTH + F_3_0MM_7_TIP / 2))):  # 118° drill point
                Cone(0, F_3_0MM_7_D / 2, F_3_0MM_7_TIP, mode=Mode.SUBTRACT)

    # Ø3.0mm 暗销孔7 on face 2
    with Locations(Plane(origin=(-4.772770579, -45.937170264, 7.608528471), x_dir=(-0.504107089648, 0, -0.863641153586), z_dir=(-0.863641153586, 0, 0.504107089648))):
        with Locations((0, 0)):
            Hole(F_3_0MM_7_ON_FACE_2_D / 2, depth=F_3_0MM_7_ON_FACE_2_DEPTH)
            with Locations((0, 0, -(F_3_0MM_7_ON_FACE_2_DEPTH + F_3_0MM_7_ON_FACE_2_TIP / 2))):  # 118° drill point
                Cone(0, F_3_0MM_7_ON_FACE_2_D / 2, F_3_0MM_7_ON_FACE_2_TIP, mode=Mode.SUBTRACT)


solid = part.part
